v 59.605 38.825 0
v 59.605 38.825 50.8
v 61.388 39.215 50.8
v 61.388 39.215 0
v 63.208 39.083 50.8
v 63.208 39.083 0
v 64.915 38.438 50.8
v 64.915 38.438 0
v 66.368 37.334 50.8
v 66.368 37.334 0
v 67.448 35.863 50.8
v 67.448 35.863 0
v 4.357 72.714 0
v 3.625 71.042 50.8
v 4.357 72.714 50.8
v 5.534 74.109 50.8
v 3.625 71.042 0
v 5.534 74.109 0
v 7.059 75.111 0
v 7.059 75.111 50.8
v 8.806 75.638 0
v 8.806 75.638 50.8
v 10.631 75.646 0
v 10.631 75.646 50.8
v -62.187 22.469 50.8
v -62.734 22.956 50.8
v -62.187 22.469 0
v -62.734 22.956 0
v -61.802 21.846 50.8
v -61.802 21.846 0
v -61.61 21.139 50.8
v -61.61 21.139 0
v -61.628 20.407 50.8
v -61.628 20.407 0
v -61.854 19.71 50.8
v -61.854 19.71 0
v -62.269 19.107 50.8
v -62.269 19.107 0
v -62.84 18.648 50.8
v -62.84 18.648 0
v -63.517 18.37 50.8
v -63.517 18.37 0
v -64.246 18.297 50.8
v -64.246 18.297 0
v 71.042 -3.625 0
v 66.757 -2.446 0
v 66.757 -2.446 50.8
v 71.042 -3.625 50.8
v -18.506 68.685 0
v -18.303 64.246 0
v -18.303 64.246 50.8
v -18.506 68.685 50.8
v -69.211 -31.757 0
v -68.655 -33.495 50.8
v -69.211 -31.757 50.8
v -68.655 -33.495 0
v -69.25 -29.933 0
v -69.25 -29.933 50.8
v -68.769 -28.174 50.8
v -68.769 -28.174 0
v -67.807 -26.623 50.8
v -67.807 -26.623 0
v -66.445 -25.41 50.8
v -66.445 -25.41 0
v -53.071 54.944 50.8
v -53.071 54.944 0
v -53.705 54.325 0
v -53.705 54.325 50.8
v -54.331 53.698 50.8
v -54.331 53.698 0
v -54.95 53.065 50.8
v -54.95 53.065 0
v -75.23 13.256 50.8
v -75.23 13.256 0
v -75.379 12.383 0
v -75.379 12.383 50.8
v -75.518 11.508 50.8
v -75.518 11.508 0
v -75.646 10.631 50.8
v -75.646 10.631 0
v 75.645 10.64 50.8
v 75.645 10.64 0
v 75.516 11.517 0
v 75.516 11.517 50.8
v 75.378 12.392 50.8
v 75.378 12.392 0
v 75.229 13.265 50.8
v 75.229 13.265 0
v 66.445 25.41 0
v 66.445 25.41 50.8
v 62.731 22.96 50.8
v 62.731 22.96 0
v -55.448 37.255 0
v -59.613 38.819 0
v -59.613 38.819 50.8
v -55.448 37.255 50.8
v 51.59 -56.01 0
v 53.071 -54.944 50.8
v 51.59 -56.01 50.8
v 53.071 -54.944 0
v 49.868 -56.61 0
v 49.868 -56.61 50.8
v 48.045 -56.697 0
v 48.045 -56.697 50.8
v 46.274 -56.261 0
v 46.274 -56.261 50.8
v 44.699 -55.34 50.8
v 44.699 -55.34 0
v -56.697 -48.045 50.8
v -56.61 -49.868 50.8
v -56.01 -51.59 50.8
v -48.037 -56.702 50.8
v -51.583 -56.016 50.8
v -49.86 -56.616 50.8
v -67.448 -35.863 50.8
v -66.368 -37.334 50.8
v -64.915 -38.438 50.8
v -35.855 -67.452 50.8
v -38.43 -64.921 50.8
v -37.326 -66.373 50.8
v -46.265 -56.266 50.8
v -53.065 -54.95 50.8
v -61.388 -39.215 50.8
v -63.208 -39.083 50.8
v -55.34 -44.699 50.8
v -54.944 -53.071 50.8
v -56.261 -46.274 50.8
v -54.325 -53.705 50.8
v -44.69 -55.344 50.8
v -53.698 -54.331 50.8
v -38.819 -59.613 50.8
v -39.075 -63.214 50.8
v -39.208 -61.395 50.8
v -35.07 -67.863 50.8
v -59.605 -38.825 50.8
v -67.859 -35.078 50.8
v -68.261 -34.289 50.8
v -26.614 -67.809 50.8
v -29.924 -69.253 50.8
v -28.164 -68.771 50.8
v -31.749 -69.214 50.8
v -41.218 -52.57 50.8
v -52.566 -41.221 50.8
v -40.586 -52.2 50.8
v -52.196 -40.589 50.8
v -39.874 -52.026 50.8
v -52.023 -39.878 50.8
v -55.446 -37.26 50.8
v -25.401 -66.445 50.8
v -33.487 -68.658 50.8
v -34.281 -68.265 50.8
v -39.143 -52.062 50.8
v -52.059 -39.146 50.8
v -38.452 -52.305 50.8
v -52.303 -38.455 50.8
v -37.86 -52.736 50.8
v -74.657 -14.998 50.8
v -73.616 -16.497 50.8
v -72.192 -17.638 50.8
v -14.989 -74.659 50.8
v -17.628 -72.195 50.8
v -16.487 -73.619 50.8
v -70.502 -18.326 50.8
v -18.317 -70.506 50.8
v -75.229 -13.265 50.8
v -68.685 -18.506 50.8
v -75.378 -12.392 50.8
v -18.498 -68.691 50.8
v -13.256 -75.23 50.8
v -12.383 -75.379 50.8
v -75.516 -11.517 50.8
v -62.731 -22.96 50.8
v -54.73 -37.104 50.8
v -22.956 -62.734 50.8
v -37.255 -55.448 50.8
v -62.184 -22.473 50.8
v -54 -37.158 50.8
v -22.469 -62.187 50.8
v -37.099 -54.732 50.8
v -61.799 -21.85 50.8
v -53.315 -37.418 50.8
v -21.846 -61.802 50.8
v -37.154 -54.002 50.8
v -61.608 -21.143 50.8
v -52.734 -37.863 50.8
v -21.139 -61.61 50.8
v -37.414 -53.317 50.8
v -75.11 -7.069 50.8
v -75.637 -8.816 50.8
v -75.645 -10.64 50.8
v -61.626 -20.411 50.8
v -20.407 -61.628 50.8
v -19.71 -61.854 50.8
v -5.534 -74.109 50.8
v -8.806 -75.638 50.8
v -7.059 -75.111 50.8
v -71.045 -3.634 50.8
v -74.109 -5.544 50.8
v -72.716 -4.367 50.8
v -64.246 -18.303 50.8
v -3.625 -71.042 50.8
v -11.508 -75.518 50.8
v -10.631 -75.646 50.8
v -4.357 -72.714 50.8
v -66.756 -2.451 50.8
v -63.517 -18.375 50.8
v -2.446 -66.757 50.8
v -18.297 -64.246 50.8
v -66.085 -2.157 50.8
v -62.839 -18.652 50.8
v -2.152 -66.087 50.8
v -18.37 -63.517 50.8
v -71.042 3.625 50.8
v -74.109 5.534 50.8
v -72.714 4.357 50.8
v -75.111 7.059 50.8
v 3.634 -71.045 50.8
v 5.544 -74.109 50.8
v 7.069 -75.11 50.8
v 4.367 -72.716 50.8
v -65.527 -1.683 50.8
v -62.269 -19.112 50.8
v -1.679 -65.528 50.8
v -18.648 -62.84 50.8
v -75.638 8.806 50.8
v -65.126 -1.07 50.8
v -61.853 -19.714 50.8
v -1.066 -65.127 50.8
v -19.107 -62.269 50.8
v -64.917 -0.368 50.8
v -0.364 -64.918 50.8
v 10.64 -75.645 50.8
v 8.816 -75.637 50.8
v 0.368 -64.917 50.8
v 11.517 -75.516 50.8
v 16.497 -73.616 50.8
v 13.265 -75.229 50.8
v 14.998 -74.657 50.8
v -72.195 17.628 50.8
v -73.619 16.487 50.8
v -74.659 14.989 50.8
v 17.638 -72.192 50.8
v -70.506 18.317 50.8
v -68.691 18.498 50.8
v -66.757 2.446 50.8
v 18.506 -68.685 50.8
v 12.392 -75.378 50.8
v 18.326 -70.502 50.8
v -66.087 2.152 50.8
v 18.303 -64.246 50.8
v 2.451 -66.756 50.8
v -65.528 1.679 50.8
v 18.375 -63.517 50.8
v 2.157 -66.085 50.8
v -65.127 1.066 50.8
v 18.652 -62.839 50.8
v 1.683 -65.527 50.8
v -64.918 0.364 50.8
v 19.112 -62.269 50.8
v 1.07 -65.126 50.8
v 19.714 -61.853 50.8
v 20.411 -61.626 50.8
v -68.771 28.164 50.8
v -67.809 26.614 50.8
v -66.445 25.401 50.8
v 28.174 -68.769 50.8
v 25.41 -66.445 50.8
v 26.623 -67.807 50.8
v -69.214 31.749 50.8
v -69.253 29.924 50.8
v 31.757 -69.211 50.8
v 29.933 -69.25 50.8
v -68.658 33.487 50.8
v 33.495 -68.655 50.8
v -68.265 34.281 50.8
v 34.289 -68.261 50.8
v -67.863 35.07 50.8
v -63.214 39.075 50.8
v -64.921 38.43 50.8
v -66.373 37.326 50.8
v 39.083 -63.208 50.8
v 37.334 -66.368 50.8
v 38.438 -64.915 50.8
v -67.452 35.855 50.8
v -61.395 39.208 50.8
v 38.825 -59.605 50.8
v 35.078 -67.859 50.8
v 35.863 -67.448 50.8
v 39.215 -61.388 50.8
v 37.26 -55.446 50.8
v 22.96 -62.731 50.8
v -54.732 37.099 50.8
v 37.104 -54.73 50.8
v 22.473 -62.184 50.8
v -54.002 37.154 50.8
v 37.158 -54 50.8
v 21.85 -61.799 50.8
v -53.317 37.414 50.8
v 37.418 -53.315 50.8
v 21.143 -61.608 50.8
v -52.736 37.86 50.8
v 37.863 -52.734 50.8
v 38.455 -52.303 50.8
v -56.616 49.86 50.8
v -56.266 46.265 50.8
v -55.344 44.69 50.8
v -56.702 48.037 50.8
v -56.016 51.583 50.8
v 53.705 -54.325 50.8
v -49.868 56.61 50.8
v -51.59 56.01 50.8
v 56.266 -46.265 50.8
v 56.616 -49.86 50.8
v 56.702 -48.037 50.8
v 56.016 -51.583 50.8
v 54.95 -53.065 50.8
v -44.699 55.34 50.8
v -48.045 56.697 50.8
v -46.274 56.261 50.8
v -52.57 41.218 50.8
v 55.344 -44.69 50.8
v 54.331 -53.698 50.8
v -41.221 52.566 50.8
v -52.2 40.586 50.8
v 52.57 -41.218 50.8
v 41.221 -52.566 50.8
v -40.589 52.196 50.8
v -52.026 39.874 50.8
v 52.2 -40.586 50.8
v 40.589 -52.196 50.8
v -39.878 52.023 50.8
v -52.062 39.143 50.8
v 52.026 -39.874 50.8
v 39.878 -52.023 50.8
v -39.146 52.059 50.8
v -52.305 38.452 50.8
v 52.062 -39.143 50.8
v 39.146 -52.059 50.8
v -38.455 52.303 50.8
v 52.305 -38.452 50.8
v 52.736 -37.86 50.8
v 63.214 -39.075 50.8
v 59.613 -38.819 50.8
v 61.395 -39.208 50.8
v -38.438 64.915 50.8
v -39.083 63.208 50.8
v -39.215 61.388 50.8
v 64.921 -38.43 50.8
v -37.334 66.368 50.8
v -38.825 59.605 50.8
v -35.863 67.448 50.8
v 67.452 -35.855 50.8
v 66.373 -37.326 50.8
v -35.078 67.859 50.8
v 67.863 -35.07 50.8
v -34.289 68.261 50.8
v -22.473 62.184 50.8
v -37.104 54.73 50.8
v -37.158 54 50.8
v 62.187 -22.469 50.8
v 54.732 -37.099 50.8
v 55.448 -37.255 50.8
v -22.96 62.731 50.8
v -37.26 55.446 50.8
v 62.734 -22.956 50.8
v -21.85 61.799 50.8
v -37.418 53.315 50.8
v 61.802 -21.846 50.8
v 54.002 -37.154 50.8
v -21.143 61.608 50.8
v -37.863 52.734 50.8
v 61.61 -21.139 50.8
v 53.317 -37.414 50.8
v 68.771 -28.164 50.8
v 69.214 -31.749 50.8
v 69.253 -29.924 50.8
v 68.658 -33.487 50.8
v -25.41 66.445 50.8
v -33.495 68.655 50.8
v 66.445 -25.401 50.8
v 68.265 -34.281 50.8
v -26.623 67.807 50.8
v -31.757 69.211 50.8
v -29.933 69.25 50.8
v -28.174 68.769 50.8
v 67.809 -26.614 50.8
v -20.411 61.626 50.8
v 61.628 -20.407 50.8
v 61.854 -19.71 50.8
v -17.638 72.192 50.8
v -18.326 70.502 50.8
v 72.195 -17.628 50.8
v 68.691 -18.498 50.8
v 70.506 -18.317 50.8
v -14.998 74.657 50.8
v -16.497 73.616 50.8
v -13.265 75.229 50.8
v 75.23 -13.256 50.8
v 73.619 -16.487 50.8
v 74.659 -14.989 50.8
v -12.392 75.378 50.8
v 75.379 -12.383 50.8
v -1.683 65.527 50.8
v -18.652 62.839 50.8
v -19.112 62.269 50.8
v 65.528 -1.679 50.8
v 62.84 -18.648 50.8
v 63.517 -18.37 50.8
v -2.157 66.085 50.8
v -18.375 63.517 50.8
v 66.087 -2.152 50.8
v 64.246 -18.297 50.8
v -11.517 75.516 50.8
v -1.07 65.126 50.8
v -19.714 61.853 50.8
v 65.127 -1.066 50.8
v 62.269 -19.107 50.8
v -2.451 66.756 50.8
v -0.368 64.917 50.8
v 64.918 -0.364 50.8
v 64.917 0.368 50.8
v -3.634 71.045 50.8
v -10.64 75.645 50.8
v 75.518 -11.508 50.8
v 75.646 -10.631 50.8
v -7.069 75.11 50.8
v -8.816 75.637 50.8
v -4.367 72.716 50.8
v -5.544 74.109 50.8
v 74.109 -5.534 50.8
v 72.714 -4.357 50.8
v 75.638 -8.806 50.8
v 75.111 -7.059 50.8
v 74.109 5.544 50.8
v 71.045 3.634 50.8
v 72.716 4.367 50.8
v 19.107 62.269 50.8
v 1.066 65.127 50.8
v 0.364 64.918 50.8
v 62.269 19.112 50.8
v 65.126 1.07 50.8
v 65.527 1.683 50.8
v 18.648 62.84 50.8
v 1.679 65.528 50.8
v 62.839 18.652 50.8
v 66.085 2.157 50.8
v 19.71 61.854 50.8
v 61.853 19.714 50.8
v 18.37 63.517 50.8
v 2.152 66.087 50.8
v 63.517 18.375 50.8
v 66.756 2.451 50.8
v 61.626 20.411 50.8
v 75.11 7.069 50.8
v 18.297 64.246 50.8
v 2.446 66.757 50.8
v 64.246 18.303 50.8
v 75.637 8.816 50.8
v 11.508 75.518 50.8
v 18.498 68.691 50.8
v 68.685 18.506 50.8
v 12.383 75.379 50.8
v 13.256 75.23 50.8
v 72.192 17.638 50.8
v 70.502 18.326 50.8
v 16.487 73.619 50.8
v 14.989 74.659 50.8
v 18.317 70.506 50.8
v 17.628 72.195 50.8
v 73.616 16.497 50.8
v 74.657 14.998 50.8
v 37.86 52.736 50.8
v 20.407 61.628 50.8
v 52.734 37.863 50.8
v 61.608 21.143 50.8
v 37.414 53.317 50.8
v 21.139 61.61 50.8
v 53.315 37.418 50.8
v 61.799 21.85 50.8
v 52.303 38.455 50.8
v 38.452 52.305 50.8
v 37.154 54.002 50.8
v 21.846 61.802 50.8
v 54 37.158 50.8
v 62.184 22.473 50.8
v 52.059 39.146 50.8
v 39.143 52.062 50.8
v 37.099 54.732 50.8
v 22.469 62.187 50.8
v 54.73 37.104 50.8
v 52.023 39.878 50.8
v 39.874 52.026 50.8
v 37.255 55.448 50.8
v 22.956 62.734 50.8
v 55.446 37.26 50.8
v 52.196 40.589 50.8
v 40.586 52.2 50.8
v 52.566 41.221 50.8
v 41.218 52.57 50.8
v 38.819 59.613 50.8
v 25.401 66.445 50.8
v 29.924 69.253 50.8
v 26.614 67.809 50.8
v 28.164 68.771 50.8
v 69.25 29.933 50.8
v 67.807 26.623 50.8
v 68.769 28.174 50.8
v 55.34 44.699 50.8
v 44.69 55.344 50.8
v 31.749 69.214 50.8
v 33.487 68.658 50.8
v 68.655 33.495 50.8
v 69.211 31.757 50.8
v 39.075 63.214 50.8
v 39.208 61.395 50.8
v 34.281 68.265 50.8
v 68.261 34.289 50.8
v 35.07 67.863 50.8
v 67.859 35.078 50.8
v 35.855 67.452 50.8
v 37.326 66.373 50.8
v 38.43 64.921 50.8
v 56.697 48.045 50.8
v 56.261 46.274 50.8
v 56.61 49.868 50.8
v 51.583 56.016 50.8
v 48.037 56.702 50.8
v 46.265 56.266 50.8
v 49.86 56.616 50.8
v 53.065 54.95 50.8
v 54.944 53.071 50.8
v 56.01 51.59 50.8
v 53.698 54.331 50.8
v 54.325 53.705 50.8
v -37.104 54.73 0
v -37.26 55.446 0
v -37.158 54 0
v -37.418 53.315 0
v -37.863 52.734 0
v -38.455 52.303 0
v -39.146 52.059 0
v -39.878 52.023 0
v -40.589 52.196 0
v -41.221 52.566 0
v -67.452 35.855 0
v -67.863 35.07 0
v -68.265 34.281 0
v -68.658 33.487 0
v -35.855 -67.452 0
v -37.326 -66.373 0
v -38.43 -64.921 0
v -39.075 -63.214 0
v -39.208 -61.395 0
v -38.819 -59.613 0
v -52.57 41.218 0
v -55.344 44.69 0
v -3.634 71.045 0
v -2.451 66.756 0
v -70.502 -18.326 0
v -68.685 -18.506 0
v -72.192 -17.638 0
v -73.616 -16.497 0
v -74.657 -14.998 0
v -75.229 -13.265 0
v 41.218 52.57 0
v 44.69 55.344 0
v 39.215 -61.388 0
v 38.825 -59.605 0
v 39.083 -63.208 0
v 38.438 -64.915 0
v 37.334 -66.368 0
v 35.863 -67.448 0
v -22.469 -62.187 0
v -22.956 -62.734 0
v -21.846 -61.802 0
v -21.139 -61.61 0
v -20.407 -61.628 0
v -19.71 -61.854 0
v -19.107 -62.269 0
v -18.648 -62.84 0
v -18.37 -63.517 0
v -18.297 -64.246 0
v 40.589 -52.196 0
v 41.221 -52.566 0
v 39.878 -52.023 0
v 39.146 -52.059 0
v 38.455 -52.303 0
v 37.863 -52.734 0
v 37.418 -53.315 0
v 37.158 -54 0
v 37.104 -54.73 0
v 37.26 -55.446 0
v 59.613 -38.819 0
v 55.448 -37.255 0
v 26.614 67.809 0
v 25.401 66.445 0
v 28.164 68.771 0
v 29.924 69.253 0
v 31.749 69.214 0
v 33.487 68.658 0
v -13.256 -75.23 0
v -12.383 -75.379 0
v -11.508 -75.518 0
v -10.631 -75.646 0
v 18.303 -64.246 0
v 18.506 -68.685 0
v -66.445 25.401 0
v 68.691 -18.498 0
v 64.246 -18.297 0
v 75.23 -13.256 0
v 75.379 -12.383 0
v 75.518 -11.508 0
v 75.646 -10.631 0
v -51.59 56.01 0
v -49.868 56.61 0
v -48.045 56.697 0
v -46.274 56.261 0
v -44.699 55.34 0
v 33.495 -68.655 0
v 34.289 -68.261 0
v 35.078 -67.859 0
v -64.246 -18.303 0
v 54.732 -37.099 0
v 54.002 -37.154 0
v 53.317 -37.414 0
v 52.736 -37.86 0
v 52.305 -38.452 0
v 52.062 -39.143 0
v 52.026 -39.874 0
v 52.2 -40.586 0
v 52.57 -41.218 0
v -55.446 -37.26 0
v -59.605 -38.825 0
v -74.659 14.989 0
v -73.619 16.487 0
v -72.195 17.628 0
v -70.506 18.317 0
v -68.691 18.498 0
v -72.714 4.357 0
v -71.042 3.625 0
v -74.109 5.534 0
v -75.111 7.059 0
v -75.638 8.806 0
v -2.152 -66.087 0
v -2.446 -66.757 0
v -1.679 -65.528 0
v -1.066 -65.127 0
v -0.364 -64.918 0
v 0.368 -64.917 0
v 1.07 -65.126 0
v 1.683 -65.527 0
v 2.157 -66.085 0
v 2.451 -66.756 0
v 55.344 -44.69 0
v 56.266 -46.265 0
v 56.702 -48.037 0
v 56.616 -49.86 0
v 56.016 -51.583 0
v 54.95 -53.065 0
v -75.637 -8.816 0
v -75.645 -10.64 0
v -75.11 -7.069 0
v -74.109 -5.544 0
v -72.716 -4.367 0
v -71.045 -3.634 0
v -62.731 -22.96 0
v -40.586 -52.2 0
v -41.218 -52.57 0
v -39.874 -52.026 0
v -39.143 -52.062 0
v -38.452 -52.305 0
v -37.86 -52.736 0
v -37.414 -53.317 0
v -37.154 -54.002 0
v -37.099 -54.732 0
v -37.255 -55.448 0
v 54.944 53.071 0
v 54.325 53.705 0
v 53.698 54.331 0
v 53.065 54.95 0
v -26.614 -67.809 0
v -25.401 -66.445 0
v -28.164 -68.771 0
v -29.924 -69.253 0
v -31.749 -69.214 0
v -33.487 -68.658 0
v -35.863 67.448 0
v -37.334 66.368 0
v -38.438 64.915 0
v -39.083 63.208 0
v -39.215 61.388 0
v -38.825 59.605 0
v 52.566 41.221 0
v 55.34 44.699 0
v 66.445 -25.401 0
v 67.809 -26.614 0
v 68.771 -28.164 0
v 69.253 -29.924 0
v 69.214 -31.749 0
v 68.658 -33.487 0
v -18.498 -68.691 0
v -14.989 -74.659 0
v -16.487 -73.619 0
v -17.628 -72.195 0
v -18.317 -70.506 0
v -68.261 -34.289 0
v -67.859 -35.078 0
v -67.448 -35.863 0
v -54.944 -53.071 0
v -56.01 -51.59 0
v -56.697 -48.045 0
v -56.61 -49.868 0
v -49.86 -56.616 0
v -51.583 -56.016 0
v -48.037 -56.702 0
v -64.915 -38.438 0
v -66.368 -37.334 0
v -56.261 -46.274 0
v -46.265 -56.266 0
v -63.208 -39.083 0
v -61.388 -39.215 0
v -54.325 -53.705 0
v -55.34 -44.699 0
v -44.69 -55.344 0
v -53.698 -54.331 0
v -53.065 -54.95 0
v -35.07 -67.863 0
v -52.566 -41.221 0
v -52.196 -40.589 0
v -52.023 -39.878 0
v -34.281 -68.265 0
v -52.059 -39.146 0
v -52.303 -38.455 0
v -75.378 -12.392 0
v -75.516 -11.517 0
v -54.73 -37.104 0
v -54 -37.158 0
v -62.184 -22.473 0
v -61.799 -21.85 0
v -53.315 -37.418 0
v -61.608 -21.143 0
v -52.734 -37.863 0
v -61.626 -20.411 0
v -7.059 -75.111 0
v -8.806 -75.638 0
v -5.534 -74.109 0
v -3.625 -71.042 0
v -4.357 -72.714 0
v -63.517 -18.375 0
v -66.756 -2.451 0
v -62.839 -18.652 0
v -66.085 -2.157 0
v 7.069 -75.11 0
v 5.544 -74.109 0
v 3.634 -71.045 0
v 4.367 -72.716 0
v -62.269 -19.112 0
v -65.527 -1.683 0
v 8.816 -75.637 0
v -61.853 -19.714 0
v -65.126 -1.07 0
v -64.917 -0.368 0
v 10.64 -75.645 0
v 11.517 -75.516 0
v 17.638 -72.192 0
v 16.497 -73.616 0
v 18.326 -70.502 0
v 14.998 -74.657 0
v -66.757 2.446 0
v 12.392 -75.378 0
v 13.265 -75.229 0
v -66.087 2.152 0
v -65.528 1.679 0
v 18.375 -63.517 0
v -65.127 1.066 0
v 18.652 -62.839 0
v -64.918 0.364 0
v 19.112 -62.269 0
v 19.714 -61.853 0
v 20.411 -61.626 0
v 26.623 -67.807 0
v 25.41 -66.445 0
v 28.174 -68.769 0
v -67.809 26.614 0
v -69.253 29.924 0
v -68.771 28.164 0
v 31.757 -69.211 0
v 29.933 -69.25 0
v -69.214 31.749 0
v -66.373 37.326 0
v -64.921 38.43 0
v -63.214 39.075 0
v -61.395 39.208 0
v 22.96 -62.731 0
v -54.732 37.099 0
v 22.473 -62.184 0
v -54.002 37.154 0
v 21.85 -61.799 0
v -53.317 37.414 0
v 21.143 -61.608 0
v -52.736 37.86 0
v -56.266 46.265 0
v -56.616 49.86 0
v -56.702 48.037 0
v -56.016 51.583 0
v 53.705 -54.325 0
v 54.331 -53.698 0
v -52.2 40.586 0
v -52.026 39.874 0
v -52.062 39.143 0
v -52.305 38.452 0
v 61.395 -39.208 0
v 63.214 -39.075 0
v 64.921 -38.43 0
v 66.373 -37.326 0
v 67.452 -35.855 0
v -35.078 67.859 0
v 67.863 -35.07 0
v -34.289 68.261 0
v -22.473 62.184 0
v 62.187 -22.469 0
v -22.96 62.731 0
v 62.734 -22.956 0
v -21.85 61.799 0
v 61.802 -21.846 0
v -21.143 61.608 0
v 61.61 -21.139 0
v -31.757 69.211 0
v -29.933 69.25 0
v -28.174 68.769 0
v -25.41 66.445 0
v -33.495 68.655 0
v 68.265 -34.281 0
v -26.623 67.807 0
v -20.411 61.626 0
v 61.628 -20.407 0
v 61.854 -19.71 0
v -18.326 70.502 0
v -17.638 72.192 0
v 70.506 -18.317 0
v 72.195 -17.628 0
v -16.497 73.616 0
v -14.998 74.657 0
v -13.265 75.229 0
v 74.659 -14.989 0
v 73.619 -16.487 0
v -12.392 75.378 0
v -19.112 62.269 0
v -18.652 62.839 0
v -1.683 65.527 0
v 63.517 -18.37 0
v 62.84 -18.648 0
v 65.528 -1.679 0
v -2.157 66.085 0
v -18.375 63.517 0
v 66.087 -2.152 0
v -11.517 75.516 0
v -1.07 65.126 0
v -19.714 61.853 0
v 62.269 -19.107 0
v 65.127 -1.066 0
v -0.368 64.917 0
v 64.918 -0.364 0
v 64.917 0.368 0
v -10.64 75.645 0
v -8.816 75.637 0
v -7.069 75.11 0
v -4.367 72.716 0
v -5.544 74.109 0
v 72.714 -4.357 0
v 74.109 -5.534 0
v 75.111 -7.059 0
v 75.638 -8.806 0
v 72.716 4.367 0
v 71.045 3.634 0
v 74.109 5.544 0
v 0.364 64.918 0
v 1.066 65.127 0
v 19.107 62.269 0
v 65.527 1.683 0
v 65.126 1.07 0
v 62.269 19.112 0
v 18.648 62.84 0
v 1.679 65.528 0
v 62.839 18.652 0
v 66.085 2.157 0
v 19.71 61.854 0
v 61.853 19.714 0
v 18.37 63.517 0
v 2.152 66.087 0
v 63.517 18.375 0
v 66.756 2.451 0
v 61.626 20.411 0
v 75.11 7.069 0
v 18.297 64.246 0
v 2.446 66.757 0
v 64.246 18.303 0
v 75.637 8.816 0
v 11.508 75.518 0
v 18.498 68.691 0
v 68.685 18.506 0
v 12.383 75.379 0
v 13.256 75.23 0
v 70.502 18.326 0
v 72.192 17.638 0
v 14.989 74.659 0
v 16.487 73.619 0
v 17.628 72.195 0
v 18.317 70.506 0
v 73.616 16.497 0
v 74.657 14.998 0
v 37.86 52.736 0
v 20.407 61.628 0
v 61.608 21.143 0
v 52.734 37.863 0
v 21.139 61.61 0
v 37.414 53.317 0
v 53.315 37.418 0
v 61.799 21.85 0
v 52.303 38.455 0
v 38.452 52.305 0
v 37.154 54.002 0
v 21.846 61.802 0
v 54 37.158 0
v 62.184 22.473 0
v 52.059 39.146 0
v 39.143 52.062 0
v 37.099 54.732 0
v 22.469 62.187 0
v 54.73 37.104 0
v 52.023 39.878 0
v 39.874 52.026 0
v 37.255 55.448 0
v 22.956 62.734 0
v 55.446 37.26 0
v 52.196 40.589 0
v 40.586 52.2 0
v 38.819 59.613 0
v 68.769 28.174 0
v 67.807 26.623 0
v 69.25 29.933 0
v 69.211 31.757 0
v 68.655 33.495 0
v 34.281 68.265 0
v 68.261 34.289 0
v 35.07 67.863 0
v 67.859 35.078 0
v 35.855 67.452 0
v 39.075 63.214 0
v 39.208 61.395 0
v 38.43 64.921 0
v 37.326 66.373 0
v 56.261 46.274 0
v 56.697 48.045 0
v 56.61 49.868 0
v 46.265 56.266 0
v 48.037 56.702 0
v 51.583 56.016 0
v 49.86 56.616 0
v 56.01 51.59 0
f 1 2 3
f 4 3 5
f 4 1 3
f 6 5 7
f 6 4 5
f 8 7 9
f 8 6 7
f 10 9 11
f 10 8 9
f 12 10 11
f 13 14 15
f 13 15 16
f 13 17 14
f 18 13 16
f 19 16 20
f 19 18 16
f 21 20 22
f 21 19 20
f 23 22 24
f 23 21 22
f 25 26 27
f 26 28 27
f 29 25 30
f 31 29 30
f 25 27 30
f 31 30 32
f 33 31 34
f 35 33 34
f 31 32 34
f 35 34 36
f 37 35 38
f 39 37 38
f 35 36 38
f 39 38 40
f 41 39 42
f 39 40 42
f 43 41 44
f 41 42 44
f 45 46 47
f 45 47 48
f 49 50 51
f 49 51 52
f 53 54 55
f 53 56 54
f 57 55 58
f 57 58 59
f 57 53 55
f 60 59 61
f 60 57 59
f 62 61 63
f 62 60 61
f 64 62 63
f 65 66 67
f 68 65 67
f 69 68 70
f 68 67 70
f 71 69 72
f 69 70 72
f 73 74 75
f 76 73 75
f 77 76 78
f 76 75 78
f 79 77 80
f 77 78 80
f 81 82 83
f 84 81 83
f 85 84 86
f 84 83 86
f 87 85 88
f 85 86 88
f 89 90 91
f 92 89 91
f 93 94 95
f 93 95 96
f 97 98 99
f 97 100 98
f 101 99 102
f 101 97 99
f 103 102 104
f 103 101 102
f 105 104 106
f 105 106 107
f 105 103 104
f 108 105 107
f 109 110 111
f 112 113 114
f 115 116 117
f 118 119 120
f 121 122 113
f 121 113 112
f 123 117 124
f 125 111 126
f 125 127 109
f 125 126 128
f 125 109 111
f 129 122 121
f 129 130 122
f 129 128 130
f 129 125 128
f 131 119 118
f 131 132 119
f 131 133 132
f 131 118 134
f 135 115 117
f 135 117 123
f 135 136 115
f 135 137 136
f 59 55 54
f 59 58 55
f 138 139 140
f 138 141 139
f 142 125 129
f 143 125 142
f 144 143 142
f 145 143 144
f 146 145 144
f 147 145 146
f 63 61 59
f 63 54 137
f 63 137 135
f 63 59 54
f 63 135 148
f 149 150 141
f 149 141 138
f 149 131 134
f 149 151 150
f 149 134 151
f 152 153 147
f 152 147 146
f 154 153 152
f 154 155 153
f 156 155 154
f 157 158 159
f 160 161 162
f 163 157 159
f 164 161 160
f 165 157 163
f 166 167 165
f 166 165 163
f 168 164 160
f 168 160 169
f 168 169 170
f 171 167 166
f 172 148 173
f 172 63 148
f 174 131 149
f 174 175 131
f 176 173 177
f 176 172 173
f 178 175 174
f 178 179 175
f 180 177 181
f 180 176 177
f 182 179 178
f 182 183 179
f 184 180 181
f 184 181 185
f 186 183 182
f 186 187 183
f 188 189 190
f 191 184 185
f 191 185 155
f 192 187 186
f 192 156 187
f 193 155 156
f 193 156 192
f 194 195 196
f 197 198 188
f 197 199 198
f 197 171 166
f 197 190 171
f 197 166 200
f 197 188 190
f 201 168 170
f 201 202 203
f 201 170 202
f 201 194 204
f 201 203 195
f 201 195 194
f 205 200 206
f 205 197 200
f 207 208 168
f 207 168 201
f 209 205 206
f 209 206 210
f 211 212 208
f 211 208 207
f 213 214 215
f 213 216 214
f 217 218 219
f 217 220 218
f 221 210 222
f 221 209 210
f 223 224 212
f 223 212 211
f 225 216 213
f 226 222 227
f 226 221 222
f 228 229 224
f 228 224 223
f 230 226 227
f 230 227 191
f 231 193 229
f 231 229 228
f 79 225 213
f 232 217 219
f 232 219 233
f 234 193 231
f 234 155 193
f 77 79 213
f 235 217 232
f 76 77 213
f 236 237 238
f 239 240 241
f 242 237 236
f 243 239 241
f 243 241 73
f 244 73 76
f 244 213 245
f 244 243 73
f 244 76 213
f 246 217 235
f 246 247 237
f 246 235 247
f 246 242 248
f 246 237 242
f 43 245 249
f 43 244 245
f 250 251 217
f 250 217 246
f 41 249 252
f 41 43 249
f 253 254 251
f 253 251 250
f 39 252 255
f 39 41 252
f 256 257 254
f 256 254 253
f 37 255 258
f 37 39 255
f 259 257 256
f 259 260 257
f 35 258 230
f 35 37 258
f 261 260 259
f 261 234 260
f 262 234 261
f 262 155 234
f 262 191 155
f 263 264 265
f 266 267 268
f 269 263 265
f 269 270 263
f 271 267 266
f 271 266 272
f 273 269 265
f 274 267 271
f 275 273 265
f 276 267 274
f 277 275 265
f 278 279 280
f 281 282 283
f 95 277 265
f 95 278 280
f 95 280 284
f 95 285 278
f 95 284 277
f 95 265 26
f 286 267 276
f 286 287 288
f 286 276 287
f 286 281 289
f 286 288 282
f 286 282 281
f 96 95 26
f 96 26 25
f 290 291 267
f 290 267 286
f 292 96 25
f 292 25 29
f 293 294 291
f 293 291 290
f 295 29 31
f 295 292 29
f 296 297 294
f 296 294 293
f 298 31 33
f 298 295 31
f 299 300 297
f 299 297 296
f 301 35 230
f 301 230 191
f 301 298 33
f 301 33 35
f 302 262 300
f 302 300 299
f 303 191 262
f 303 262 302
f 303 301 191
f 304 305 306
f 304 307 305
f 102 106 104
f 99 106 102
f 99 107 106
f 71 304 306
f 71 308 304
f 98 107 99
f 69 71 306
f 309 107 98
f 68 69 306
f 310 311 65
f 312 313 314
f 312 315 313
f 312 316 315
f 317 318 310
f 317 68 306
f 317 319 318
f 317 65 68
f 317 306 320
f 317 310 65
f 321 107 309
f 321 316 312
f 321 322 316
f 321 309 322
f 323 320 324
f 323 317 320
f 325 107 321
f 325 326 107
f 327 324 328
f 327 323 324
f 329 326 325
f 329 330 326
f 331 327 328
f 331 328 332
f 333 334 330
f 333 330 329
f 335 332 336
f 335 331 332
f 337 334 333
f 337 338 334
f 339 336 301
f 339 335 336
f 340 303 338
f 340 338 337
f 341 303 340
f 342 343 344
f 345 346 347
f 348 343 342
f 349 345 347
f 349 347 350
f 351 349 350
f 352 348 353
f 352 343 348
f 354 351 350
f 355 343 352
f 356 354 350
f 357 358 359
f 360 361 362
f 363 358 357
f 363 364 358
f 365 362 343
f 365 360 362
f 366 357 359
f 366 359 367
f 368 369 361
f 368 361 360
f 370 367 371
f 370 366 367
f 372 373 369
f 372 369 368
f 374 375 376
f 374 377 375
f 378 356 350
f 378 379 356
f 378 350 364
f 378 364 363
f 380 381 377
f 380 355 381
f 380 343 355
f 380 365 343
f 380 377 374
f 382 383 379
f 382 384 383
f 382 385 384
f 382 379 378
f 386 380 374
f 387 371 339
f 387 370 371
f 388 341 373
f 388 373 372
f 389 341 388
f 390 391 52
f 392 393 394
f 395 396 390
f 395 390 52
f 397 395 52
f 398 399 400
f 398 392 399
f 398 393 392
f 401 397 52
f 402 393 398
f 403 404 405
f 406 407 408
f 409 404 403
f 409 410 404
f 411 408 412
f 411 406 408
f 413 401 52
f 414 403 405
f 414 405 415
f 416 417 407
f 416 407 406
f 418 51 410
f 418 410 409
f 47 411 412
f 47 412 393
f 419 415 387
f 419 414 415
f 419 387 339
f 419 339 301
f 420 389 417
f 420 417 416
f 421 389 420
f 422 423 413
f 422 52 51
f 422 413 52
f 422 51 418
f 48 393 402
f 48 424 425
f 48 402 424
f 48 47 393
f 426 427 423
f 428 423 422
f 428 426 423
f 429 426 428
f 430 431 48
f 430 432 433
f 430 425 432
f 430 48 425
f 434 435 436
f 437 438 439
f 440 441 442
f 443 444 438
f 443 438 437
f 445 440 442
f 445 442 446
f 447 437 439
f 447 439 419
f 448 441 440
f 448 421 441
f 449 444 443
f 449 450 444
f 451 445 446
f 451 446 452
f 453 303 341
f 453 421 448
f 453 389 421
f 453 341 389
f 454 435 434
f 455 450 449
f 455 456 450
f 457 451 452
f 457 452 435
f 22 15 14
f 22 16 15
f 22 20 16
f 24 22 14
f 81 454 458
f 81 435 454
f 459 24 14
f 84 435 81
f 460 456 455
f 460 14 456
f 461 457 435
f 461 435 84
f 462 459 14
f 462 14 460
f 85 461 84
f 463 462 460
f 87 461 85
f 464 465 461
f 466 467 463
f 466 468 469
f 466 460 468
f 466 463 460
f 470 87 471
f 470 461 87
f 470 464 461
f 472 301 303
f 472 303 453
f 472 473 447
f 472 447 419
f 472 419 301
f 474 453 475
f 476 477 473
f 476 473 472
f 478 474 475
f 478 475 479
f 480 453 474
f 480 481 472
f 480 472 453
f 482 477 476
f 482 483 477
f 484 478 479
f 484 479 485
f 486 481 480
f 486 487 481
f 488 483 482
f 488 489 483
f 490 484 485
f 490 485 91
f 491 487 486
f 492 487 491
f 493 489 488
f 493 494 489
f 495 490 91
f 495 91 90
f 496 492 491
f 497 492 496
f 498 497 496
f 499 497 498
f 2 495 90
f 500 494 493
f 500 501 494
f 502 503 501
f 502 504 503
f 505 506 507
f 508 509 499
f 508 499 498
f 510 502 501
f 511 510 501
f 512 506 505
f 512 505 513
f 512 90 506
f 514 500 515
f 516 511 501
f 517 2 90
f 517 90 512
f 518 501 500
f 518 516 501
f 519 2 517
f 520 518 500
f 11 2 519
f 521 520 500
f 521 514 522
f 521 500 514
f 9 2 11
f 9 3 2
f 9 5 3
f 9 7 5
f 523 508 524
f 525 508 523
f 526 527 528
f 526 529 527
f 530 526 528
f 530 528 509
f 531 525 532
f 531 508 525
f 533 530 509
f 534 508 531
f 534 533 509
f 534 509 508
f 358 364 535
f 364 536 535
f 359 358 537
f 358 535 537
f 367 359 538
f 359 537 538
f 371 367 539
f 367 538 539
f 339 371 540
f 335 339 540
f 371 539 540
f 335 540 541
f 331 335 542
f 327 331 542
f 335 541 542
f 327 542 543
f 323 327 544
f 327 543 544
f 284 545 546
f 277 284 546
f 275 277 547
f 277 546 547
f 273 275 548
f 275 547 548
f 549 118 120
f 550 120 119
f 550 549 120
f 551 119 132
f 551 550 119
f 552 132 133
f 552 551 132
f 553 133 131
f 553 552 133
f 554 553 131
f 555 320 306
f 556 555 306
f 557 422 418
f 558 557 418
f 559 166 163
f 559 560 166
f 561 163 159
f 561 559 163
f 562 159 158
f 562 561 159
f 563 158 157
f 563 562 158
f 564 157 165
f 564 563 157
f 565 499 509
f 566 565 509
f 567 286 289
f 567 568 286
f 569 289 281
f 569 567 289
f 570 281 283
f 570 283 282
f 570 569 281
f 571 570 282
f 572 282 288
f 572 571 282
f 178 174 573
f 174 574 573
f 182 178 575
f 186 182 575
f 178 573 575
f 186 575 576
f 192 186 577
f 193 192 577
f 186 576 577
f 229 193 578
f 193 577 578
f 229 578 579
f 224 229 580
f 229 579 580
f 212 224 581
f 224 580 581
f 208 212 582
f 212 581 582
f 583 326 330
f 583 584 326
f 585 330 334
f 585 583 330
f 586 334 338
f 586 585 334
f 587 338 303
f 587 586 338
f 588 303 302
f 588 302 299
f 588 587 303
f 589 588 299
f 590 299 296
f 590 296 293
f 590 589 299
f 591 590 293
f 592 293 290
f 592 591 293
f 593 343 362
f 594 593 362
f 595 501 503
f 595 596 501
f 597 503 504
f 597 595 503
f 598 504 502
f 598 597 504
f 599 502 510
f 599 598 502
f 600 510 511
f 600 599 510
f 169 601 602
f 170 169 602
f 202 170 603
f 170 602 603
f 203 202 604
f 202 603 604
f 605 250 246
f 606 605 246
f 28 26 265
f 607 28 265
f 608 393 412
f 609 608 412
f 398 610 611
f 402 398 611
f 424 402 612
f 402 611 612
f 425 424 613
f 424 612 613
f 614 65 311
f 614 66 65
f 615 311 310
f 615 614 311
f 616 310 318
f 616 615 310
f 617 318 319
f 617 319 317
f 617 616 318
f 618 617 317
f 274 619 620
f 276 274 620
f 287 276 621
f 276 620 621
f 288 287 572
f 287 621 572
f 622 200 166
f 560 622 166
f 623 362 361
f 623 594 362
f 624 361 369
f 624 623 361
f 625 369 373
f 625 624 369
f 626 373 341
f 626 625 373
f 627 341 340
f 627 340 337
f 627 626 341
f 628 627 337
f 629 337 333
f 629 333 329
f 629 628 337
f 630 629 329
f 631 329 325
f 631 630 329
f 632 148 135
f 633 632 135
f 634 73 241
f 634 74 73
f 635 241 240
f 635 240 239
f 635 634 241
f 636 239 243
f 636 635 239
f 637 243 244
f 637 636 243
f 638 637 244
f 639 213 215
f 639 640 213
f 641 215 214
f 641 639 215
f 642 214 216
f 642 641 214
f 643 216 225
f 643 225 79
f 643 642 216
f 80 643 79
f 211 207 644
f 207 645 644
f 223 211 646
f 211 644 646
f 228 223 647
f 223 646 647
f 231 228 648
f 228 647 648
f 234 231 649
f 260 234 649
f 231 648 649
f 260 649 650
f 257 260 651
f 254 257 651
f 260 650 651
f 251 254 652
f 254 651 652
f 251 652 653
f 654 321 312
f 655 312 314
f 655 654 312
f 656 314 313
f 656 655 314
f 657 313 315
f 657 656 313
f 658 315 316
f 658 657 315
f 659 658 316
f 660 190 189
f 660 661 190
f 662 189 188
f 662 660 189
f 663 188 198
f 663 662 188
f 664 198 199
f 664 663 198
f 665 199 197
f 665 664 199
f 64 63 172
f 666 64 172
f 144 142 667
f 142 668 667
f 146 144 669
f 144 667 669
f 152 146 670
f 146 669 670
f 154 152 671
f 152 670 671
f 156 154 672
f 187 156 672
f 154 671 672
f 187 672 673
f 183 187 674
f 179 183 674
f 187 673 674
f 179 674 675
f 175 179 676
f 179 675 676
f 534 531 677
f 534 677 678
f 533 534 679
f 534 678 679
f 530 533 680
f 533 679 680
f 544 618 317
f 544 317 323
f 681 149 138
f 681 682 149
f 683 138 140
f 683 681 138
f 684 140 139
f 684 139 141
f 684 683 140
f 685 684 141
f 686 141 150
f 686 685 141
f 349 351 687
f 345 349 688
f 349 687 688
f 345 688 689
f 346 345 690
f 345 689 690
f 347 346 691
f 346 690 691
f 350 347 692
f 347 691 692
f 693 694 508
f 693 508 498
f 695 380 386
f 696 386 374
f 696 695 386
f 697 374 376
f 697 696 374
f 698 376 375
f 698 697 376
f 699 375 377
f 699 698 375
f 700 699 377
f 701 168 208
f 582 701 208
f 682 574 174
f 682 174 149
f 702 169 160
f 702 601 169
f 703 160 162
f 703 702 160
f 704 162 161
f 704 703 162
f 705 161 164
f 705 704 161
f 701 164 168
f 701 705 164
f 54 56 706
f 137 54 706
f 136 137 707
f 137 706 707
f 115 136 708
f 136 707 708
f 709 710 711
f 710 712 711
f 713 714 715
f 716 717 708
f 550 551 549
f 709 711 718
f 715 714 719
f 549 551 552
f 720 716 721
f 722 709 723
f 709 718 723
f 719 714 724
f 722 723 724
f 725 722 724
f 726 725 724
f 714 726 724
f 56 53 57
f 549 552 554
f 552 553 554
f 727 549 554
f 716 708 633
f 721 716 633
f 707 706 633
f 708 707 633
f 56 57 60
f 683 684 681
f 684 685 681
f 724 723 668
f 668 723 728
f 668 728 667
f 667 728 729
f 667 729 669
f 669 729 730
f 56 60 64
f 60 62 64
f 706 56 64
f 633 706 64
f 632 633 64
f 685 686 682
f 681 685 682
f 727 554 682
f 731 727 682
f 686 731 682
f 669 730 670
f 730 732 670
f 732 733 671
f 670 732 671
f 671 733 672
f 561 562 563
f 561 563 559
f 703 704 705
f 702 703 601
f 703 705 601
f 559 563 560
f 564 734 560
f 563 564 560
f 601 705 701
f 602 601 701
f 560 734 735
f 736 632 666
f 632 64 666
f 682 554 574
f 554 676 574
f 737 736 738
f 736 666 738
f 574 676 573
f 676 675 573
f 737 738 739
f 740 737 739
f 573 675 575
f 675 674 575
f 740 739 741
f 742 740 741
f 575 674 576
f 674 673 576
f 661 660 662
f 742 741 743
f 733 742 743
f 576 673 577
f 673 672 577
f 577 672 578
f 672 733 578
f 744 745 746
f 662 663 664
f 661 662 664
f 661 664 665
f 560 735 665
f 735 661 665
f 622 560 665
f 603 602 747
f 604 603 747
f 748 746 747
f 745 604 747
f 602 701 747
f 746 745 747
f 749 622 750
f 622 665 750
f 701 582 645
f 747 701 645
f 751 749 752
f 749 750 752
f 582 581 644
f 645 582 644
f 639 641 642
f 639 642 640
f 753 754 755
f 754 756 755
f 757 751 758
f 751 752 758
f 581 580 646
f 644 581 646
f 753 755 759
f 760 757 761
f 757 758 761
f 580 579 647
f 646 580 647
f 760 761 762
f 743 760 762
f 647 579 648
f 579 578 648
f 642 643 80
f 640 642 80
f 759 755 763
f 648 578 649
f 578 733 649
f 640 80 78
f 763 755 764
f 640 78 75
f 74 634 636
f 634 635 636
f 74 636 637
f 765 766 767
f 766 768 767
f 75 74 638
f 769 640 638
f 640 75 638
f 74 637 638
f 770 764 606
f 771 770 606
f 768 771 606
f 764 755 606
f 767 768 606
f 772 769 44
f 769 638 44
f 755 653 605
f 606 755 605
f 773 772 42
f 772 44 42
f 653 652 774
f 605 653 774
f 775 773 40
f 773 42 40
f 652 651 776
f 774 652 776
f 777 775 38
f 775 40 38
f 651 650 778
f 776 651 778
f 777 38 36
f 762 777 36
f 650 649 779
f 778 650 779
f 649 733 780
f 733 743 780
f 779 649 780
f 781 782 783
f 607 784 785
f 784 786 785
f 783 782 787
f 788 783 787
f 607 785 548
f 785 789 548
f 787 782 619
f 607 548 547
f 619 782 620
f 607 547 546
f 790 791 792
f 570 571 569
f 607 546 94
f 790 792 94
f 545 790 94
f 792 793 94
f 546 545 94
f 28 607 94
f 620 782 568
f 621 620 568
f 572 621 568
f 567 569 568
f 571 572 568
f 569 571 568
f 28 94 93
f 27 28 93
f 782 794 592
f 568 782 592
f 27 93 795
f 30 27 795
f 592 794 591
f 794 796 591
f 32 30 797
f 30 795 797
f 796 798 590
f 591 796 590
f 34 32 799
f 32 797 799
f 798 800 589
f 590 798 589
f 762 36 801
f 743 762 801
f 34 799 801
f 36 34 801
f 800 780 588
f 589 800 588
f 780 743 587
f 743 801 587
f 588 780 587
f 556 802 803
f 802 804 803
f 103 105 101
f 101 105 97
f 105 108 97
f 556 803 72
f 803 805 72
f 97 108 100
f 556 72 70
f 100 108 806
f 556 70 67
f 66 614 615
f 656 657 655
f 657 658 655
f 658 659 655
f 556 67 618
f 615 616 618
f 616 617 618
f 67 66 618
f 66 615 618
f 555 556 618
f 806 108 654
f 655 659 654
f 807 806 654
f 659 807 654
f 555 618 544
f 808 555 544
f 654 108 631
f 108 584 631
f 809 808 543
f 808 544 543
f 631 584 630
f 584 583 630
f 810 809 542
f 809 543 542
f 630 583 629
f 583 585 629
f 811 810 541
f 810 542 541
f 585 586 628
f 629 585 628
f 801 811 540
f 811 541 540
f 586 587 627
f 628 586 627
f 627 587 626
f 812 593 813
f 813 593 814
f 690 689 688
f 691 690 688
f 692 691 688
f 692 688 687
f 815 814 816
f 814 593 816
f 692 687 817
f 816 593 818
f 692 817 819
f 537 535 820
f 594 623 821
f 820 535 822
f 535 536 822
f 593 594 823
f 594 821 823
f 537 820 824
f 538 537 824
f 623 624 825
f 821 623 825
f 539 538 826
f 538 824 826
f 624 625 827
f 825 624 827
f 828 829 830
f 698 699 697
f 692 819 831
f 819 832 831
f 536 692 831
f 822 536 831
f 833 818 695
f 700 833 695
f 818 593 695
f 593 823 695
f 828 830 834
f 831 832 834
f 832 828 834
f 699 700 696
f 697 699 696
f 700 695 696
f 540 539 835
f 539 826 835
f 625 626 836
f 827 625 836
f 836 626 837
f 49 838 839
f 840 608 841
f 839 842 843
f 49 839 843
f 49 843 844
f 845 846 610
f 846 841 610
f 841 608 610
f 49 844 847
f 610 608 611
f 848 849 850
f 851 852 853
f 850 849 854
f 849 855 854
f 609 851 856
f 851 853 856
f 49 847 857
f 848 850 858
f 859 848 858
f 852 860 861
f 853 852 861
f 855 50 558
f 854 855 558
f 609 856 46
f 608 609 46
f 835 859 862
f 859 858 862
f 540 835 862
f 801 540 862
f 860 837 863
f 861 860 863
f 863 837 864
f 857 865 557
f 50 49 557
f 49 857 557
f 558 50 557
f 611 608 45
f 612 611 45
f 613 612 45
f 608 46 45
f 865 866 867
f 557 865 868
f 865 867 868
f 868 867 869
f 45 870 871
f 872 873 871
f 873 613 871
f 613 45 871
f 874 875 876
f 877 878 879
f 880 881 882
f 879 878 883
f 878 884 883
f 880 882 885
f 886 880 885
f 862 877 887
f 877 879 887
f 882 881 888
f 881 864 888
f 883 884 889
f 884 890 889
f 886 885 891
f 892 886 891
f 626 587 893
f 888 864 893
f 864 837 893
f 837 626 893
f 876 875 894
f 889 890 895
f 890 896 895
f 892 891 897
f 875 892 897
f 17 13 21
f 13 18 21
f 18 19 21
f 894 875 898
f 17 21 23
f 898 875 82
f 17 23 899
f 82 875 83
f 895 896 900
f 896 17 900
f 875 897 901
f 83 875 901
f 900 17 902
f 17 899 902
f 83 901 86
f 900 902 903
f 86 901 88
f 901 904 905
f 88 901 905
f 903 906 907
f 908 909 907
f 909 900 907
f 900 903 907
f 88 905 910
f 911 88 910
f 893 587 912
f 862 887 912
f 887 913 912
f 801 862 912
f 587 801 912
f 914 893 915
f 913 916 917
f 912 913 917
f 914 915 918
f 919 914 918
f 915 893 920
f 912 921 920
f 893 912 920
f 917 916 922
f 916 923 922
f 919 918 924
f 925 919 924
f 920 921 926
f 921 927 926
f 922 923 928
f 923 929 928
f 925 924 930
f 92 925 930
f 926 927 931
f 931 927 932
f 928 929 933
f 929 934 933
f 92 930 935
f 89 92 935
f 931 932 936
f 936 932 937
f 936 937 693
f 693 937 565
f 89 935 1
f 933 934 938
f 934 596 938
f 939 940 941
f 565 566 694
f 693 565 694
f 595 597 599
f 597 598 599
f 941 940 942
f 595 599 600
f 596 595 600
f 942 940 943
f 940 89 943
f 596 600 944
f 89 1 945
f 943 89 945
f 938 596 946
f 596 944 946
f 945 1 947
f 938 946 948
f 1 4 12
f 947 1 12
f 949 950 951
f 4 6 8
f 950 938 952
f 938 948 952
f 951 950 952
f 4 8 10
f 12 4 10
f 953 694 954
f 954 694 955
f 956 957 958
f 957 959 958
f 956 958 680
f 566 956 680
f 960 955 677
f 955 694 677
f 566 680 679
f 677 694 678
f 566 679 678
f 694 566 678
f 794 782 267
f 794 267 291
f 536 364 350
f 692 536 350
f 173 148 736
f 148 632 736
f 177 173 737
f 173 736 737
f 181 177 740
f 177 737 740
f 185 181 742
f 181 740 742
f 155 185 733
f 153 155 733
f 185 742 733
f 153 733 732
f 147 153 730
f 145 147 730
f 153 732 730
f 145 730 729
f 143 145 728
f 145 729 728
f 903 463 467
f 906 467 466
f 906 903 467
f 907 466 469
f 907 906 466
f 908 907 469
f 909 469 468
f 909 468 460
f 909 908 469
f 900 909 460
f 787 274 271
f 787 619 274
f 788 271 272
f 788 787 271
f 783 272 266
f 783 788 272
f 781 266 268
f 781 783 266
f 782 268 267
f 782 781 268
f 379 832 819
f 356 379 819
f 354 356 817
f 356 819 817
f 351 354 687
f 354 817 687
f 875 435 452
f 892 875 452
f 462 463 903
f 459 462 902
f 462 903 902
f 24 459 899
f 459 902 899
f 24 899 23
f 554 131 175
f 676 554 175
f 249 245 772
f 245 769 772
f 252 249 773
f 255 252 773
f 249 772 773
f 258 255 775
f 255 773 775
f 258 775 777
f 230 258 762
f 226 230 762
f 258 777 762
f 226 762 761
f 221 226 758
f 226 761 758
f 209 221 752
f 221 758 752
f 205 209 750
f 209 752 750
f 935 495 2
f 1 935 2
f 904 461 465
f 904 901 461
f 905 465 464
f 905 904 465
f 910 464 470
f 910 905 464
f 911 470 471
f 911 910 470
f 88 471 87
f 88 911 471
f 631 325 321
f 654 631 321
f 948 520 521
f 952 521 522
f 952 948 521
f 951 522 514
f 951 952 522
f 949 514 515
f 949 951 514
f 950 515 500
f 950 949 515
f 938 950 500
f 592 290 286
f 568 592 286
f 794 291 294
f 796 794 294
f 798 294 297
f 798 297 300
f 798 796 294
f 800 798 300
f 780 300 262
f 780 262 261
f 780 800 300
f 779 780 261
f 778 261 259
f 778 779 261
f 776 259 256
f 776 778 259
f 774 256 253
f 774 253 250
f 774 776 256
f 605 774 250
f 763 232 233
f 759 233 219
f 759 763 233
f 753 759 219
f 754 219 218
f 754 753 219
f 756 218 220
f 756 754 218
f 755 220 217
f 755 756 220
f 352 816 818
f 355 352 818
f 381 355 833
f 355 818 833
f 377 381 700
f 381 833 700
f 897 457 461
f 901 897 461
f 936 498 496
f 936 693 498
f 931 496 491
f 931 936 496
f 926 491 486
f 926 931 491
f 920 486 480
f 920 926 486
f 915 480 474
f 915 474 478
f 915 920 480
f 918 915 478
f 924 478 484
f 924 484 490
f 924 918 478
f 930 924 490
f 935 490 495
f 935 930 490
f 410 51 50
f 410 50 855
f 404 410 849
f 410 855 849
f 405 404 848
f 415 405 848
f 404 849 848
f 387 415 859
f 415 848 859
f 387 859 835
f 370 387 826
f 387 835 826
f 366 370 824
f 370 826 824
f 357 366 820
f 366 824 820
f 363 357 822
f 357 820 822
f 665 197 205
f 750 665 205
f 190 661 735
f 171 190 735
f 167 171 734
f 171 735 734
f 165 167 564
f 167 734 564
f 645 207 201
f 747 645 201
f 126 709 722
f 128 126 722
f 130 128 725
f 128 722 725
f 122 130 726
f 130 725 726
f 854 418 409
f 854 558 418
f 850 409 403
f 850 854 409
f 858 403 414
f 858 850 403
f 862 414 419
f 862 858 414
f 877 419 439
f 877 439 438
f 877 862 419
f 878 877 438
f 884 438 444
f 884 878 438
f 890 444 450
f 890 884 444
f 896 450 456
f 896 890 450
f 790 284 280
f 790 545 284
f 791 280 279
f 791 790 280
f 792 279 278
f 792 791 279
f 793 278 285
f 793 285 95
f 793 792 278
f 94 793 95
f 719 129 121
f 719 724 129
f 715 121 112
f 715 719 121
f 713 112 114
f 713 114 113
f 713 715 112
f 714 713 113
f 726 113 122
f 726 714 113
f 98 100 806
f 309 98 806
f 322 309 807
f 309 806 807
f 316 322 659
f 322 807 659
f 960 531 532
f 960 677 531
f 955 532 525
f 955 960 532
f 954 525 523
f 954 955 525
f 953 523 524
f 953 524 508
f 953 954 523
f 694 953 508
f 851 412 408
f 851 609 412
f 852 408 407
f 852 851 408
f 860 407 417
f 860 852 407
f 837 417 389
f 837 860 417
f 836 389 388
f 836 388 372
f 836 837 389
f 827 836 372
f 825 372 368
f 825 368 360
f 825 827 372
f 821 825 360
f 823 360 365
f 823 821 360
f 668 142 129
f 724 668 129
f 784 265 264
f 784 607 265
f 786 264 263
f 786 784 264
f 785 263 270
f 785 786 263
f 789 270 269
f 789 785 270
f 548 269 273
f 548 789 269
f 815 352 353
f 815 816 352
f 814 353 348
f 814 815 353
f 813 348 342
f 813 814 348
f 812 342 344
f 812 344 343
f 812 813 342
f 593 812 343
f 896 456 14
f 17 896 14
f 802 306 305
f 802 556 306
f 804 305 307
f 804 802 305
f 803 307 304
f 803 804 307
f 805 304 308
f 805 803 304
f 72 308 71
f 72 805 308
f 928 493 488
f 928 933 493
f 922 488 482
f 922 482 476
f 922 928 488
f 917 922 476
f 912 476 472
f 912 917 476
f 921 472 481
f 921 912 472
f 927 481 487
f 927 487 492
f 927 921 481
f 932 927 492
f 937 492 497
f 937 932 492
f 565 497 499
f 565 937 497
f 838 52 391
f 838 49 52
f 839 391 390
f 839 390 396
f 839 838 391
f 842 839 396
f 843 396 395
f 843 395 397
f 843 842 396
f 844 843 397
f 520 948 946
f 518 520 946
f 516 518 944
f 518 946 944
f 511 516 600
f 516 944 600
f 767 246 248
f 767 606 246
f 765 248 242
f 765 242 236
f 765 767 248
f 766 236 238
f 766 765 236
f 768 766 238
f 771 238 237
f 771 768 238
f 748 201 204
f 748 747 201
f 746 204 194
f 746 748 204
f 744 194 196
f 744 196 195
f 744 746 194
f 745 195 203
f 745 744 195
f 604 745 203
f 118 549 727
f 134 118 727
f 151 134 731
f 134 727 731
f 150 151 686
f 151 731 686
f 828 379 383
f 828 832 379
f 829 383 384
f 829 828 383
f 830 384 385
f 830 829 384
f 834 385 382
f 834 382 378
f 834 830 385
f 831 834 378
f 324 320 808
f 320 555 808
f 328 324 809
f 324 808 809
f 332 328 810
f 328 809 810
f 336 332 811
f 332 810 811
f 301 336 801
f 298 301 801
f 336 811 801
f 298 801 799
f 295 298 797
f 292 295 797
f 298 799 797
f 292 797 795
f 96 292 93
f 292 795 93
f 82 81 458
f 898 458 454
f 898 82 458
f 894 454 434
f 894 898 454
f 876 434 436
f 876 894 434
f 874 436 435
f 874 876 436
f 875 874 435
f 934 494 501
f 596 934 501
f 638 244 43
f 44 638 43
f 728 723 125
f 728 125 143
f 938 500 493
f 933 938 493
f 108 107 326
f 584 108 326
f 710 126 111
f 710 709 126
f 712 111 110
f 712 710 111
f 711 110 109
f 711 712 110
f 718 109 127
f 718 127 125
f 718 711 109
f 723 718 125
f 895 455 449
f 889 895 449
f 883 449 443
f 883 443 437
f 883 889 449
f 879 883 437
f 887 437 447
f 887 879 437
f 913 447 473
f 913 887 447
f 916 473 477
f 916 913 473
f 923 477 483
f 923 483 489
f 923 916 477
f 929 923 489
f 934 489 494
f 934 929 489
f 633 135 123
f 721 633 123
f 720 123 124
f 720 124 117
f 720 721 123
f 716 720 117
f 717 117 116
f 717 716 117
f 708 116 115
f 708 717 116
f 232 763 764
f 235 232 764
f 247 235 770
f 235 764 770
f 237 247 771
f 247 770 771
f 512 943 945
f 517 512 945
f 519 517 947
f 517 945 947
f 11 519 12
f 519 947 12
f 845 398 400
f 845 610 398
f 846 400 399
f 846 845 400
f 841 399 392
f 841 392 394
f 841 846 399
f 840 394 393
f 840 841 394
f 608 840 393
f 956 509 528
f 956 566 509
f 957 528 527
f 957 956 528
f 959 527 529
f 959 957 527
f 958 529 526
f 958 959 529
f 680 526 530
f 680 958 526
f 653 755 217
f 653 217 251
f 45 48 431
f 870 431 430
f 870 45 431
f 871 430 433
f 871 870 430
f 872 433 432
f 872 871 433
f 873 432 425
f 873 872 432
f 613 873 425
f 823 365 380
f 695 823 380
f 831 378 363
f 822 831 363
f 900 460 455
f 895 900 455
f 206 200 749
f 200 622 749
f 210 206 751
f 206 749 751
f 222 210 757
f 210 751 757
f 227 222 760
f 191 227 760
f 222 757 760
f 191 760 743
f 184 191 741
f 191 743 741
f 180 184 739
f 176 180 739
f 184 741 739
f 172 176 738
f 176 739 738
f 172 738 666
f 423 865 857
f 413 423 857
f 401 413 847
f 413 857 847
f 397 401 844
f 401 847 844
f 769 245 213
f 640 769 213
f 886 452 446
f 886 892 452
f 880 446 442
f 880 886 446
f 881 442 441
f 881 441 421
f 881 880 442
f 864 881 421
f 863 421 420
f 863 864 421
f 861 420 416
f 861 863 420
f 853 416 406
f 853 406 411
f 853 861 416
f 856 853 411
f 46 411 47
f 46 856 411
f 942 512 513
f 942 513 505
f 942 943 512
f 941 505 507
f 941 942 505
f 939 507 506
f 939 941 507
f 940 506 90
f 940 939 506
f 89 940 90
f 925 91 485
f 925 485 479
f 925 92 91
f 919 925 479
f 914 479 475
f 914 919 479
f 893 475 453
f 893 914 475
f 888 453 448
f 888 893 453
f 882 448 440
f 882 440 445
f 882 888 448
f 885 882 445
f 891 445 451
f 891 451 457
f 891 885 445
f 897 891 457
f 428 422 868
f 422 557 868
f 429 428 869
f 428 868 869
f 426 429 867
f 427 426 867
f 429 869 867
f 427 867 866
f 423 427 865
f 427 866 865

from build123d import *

# Parameters (mm, degrees)
F0_R            = 76.3894607231
F1_DEPTH        = 25.4
F2_DEPTH        = 25.4
F4_DEPTH        = 50.8
F4_COPIES_COUNT = 20
F5_R            = 6.35
F6_R            = 2.54


# Not quite as in the source:
# - a pattern or mirror of a feature is missing from the dataset's text; its kind, count and spacing are read off the source's solid


with BuildPart() as f1:
    # F0 (on Top) → F1 (new body)
    with BuildSketch(Plane.XY):
        Circle(F0_R)
    extrude(amount=F1_DEPTH)

    # F2 (add): a face of the model
    f2_faces = [f1.faces().sort_by_distance(p)[0] for p in [
        (0, 0, 25.4),
    ]]
    extrude(f2_faces, amount=F2_DEPTH)

    # F3 (on face) → F4 (cut)
    with BuildSketch(Plane.XY.offset(50.8)):
        with BuildLine():
            ThreePointArc((5.0502526328, 76.2223370011), (-0.0057278173, 76.3894605084), (-5.0616831482, 76.2215787902))
            Line((-5.0616831482, 76.2215787902), (0, 57.8660437425))
            Line((0, 57.8660437425), (5.0502526328, 76.2223370011))
        make_face()
    f4 = extrude(amount=-F4_DEPTH, mode=Mode.SUBTRACT)

    # F4_copies: F4 ×20 about axis
    f4_copies_axis = Axis((0, 0, 0), (0, 0, 1))
    for i in range(1, F4_COPIES_COUNT):
        add(f4.rotate(f4_copies_axis, i * 360 / F4_COPIES_COUNT), mode=Mode.SUBTRACT)

    # F5
    f5_edges = [f1.edges().sort_by_distance(p)[0] for p in [
        (-5.061683, 76.221579, 25.4),
        (5.050253, 76.222337, 25.4),
        (-18.750922, 74.052364, 25.4),
        (18.739816, 74.055175, 25.4),
        (28.357073, 70.931136, 25.4),
        (40.706932, 64.639735, 25.4),
        (48.888106, 58.696702, 25.4),
        (58.68937, 48.896908, 25.4),
        (64.63363, 40.716625, 25.4),
        (70.926883, 28.36771, 25.4),
        (74.052364, 18.750922, 25.4),
        (76.221579, 5.061683, 25.4),
        (76.222337, -5.050253, 25.4),
        (74.055175, -18.739816, 25.4),
        (70.931136, -28.357073, 25.4),
        (64.639735, -40.706932, 25.4),
        (58.696702, -48.888106, 25.4),
        (48.896908, -58.68937, 25.4),
        (40.716625, -64.63363, 25.4),
        (28.36771, -70.926883, 25.4),
        (18.750922, -74.052364, 25.4),
        (5.061683, -76.221579, 25.4),
        (-5.050253, -76.222337, 25.4),
        (-18.739816, -74.055175, 25.4),
        (-28.357073, -70.931136, 25.4),
        (-40.706932, -64.639735, 25.4),
        (-48.888106, -58.696702, 25.4),
        (-58.68937, -48.896908, 25.4),
        (-64.63363, -40.716625, 25.4),
        (-70.926883, -28.36771, 25.4),
        (-74.052364, -18.750922, 25.4),
        (-76.221579, -5.061683, 25.4),
        (-76.222337, 5.050253, 25.4),
        (-74.055175, 18.739816, 25.4),
        (-70.931136, 28.357073, 25.4),
        (-64.639735, 40.706932, 25.4),
        (-58.696702, 48.888106, 25.4),
        (-48.896908, 58.68937, 25.4),
        (-40.716625, 64.63363, 25.4),
        (-28.36771, 70.926883, 25.4),
    ]]
    fillet(f5_edges, radius=F5_R)

    # F6
    f6_edges = [f1.edges().sort_by_distance(p)[0] for p in [
        (0, 57.866044, 25.4),
        (-17.881591, 55.033878, 25.4),
        (17.881591, 55.033878, 25.4),
        (-34.012807, 46.814613, 25.4),
        (34.012807, 46.814613, 25.4),
        (-46.814613, 34.012807, 25.4),
        (46.814613, 34.012807, 25.4),
        (-55.033878, 17.881591, 25.4),
        (55.033878, 17.881591, 25.4),
        (-57.866044, 0, 25.4),
        (57.866044, 0, 25.4),
        (-55.033878, -17.881591, 25.4),
        (55.033878, -17.881591, 25.4),
        (-46.814613, -34.012807, 25.4),
        (46.814613, -34.012807, 25.4),
        (-34.012807, -46.814613, 25.4),
        (34.012807, -46.814613, 25.4),
        (-17.881591, -55.033878, 25.4),
        (17.881591, -55.033878, 25.4),
        (0, -57.866044, 25.4),
    ]]
    fillet(f6_edges, radius=F6_R)


solid = f1.part
